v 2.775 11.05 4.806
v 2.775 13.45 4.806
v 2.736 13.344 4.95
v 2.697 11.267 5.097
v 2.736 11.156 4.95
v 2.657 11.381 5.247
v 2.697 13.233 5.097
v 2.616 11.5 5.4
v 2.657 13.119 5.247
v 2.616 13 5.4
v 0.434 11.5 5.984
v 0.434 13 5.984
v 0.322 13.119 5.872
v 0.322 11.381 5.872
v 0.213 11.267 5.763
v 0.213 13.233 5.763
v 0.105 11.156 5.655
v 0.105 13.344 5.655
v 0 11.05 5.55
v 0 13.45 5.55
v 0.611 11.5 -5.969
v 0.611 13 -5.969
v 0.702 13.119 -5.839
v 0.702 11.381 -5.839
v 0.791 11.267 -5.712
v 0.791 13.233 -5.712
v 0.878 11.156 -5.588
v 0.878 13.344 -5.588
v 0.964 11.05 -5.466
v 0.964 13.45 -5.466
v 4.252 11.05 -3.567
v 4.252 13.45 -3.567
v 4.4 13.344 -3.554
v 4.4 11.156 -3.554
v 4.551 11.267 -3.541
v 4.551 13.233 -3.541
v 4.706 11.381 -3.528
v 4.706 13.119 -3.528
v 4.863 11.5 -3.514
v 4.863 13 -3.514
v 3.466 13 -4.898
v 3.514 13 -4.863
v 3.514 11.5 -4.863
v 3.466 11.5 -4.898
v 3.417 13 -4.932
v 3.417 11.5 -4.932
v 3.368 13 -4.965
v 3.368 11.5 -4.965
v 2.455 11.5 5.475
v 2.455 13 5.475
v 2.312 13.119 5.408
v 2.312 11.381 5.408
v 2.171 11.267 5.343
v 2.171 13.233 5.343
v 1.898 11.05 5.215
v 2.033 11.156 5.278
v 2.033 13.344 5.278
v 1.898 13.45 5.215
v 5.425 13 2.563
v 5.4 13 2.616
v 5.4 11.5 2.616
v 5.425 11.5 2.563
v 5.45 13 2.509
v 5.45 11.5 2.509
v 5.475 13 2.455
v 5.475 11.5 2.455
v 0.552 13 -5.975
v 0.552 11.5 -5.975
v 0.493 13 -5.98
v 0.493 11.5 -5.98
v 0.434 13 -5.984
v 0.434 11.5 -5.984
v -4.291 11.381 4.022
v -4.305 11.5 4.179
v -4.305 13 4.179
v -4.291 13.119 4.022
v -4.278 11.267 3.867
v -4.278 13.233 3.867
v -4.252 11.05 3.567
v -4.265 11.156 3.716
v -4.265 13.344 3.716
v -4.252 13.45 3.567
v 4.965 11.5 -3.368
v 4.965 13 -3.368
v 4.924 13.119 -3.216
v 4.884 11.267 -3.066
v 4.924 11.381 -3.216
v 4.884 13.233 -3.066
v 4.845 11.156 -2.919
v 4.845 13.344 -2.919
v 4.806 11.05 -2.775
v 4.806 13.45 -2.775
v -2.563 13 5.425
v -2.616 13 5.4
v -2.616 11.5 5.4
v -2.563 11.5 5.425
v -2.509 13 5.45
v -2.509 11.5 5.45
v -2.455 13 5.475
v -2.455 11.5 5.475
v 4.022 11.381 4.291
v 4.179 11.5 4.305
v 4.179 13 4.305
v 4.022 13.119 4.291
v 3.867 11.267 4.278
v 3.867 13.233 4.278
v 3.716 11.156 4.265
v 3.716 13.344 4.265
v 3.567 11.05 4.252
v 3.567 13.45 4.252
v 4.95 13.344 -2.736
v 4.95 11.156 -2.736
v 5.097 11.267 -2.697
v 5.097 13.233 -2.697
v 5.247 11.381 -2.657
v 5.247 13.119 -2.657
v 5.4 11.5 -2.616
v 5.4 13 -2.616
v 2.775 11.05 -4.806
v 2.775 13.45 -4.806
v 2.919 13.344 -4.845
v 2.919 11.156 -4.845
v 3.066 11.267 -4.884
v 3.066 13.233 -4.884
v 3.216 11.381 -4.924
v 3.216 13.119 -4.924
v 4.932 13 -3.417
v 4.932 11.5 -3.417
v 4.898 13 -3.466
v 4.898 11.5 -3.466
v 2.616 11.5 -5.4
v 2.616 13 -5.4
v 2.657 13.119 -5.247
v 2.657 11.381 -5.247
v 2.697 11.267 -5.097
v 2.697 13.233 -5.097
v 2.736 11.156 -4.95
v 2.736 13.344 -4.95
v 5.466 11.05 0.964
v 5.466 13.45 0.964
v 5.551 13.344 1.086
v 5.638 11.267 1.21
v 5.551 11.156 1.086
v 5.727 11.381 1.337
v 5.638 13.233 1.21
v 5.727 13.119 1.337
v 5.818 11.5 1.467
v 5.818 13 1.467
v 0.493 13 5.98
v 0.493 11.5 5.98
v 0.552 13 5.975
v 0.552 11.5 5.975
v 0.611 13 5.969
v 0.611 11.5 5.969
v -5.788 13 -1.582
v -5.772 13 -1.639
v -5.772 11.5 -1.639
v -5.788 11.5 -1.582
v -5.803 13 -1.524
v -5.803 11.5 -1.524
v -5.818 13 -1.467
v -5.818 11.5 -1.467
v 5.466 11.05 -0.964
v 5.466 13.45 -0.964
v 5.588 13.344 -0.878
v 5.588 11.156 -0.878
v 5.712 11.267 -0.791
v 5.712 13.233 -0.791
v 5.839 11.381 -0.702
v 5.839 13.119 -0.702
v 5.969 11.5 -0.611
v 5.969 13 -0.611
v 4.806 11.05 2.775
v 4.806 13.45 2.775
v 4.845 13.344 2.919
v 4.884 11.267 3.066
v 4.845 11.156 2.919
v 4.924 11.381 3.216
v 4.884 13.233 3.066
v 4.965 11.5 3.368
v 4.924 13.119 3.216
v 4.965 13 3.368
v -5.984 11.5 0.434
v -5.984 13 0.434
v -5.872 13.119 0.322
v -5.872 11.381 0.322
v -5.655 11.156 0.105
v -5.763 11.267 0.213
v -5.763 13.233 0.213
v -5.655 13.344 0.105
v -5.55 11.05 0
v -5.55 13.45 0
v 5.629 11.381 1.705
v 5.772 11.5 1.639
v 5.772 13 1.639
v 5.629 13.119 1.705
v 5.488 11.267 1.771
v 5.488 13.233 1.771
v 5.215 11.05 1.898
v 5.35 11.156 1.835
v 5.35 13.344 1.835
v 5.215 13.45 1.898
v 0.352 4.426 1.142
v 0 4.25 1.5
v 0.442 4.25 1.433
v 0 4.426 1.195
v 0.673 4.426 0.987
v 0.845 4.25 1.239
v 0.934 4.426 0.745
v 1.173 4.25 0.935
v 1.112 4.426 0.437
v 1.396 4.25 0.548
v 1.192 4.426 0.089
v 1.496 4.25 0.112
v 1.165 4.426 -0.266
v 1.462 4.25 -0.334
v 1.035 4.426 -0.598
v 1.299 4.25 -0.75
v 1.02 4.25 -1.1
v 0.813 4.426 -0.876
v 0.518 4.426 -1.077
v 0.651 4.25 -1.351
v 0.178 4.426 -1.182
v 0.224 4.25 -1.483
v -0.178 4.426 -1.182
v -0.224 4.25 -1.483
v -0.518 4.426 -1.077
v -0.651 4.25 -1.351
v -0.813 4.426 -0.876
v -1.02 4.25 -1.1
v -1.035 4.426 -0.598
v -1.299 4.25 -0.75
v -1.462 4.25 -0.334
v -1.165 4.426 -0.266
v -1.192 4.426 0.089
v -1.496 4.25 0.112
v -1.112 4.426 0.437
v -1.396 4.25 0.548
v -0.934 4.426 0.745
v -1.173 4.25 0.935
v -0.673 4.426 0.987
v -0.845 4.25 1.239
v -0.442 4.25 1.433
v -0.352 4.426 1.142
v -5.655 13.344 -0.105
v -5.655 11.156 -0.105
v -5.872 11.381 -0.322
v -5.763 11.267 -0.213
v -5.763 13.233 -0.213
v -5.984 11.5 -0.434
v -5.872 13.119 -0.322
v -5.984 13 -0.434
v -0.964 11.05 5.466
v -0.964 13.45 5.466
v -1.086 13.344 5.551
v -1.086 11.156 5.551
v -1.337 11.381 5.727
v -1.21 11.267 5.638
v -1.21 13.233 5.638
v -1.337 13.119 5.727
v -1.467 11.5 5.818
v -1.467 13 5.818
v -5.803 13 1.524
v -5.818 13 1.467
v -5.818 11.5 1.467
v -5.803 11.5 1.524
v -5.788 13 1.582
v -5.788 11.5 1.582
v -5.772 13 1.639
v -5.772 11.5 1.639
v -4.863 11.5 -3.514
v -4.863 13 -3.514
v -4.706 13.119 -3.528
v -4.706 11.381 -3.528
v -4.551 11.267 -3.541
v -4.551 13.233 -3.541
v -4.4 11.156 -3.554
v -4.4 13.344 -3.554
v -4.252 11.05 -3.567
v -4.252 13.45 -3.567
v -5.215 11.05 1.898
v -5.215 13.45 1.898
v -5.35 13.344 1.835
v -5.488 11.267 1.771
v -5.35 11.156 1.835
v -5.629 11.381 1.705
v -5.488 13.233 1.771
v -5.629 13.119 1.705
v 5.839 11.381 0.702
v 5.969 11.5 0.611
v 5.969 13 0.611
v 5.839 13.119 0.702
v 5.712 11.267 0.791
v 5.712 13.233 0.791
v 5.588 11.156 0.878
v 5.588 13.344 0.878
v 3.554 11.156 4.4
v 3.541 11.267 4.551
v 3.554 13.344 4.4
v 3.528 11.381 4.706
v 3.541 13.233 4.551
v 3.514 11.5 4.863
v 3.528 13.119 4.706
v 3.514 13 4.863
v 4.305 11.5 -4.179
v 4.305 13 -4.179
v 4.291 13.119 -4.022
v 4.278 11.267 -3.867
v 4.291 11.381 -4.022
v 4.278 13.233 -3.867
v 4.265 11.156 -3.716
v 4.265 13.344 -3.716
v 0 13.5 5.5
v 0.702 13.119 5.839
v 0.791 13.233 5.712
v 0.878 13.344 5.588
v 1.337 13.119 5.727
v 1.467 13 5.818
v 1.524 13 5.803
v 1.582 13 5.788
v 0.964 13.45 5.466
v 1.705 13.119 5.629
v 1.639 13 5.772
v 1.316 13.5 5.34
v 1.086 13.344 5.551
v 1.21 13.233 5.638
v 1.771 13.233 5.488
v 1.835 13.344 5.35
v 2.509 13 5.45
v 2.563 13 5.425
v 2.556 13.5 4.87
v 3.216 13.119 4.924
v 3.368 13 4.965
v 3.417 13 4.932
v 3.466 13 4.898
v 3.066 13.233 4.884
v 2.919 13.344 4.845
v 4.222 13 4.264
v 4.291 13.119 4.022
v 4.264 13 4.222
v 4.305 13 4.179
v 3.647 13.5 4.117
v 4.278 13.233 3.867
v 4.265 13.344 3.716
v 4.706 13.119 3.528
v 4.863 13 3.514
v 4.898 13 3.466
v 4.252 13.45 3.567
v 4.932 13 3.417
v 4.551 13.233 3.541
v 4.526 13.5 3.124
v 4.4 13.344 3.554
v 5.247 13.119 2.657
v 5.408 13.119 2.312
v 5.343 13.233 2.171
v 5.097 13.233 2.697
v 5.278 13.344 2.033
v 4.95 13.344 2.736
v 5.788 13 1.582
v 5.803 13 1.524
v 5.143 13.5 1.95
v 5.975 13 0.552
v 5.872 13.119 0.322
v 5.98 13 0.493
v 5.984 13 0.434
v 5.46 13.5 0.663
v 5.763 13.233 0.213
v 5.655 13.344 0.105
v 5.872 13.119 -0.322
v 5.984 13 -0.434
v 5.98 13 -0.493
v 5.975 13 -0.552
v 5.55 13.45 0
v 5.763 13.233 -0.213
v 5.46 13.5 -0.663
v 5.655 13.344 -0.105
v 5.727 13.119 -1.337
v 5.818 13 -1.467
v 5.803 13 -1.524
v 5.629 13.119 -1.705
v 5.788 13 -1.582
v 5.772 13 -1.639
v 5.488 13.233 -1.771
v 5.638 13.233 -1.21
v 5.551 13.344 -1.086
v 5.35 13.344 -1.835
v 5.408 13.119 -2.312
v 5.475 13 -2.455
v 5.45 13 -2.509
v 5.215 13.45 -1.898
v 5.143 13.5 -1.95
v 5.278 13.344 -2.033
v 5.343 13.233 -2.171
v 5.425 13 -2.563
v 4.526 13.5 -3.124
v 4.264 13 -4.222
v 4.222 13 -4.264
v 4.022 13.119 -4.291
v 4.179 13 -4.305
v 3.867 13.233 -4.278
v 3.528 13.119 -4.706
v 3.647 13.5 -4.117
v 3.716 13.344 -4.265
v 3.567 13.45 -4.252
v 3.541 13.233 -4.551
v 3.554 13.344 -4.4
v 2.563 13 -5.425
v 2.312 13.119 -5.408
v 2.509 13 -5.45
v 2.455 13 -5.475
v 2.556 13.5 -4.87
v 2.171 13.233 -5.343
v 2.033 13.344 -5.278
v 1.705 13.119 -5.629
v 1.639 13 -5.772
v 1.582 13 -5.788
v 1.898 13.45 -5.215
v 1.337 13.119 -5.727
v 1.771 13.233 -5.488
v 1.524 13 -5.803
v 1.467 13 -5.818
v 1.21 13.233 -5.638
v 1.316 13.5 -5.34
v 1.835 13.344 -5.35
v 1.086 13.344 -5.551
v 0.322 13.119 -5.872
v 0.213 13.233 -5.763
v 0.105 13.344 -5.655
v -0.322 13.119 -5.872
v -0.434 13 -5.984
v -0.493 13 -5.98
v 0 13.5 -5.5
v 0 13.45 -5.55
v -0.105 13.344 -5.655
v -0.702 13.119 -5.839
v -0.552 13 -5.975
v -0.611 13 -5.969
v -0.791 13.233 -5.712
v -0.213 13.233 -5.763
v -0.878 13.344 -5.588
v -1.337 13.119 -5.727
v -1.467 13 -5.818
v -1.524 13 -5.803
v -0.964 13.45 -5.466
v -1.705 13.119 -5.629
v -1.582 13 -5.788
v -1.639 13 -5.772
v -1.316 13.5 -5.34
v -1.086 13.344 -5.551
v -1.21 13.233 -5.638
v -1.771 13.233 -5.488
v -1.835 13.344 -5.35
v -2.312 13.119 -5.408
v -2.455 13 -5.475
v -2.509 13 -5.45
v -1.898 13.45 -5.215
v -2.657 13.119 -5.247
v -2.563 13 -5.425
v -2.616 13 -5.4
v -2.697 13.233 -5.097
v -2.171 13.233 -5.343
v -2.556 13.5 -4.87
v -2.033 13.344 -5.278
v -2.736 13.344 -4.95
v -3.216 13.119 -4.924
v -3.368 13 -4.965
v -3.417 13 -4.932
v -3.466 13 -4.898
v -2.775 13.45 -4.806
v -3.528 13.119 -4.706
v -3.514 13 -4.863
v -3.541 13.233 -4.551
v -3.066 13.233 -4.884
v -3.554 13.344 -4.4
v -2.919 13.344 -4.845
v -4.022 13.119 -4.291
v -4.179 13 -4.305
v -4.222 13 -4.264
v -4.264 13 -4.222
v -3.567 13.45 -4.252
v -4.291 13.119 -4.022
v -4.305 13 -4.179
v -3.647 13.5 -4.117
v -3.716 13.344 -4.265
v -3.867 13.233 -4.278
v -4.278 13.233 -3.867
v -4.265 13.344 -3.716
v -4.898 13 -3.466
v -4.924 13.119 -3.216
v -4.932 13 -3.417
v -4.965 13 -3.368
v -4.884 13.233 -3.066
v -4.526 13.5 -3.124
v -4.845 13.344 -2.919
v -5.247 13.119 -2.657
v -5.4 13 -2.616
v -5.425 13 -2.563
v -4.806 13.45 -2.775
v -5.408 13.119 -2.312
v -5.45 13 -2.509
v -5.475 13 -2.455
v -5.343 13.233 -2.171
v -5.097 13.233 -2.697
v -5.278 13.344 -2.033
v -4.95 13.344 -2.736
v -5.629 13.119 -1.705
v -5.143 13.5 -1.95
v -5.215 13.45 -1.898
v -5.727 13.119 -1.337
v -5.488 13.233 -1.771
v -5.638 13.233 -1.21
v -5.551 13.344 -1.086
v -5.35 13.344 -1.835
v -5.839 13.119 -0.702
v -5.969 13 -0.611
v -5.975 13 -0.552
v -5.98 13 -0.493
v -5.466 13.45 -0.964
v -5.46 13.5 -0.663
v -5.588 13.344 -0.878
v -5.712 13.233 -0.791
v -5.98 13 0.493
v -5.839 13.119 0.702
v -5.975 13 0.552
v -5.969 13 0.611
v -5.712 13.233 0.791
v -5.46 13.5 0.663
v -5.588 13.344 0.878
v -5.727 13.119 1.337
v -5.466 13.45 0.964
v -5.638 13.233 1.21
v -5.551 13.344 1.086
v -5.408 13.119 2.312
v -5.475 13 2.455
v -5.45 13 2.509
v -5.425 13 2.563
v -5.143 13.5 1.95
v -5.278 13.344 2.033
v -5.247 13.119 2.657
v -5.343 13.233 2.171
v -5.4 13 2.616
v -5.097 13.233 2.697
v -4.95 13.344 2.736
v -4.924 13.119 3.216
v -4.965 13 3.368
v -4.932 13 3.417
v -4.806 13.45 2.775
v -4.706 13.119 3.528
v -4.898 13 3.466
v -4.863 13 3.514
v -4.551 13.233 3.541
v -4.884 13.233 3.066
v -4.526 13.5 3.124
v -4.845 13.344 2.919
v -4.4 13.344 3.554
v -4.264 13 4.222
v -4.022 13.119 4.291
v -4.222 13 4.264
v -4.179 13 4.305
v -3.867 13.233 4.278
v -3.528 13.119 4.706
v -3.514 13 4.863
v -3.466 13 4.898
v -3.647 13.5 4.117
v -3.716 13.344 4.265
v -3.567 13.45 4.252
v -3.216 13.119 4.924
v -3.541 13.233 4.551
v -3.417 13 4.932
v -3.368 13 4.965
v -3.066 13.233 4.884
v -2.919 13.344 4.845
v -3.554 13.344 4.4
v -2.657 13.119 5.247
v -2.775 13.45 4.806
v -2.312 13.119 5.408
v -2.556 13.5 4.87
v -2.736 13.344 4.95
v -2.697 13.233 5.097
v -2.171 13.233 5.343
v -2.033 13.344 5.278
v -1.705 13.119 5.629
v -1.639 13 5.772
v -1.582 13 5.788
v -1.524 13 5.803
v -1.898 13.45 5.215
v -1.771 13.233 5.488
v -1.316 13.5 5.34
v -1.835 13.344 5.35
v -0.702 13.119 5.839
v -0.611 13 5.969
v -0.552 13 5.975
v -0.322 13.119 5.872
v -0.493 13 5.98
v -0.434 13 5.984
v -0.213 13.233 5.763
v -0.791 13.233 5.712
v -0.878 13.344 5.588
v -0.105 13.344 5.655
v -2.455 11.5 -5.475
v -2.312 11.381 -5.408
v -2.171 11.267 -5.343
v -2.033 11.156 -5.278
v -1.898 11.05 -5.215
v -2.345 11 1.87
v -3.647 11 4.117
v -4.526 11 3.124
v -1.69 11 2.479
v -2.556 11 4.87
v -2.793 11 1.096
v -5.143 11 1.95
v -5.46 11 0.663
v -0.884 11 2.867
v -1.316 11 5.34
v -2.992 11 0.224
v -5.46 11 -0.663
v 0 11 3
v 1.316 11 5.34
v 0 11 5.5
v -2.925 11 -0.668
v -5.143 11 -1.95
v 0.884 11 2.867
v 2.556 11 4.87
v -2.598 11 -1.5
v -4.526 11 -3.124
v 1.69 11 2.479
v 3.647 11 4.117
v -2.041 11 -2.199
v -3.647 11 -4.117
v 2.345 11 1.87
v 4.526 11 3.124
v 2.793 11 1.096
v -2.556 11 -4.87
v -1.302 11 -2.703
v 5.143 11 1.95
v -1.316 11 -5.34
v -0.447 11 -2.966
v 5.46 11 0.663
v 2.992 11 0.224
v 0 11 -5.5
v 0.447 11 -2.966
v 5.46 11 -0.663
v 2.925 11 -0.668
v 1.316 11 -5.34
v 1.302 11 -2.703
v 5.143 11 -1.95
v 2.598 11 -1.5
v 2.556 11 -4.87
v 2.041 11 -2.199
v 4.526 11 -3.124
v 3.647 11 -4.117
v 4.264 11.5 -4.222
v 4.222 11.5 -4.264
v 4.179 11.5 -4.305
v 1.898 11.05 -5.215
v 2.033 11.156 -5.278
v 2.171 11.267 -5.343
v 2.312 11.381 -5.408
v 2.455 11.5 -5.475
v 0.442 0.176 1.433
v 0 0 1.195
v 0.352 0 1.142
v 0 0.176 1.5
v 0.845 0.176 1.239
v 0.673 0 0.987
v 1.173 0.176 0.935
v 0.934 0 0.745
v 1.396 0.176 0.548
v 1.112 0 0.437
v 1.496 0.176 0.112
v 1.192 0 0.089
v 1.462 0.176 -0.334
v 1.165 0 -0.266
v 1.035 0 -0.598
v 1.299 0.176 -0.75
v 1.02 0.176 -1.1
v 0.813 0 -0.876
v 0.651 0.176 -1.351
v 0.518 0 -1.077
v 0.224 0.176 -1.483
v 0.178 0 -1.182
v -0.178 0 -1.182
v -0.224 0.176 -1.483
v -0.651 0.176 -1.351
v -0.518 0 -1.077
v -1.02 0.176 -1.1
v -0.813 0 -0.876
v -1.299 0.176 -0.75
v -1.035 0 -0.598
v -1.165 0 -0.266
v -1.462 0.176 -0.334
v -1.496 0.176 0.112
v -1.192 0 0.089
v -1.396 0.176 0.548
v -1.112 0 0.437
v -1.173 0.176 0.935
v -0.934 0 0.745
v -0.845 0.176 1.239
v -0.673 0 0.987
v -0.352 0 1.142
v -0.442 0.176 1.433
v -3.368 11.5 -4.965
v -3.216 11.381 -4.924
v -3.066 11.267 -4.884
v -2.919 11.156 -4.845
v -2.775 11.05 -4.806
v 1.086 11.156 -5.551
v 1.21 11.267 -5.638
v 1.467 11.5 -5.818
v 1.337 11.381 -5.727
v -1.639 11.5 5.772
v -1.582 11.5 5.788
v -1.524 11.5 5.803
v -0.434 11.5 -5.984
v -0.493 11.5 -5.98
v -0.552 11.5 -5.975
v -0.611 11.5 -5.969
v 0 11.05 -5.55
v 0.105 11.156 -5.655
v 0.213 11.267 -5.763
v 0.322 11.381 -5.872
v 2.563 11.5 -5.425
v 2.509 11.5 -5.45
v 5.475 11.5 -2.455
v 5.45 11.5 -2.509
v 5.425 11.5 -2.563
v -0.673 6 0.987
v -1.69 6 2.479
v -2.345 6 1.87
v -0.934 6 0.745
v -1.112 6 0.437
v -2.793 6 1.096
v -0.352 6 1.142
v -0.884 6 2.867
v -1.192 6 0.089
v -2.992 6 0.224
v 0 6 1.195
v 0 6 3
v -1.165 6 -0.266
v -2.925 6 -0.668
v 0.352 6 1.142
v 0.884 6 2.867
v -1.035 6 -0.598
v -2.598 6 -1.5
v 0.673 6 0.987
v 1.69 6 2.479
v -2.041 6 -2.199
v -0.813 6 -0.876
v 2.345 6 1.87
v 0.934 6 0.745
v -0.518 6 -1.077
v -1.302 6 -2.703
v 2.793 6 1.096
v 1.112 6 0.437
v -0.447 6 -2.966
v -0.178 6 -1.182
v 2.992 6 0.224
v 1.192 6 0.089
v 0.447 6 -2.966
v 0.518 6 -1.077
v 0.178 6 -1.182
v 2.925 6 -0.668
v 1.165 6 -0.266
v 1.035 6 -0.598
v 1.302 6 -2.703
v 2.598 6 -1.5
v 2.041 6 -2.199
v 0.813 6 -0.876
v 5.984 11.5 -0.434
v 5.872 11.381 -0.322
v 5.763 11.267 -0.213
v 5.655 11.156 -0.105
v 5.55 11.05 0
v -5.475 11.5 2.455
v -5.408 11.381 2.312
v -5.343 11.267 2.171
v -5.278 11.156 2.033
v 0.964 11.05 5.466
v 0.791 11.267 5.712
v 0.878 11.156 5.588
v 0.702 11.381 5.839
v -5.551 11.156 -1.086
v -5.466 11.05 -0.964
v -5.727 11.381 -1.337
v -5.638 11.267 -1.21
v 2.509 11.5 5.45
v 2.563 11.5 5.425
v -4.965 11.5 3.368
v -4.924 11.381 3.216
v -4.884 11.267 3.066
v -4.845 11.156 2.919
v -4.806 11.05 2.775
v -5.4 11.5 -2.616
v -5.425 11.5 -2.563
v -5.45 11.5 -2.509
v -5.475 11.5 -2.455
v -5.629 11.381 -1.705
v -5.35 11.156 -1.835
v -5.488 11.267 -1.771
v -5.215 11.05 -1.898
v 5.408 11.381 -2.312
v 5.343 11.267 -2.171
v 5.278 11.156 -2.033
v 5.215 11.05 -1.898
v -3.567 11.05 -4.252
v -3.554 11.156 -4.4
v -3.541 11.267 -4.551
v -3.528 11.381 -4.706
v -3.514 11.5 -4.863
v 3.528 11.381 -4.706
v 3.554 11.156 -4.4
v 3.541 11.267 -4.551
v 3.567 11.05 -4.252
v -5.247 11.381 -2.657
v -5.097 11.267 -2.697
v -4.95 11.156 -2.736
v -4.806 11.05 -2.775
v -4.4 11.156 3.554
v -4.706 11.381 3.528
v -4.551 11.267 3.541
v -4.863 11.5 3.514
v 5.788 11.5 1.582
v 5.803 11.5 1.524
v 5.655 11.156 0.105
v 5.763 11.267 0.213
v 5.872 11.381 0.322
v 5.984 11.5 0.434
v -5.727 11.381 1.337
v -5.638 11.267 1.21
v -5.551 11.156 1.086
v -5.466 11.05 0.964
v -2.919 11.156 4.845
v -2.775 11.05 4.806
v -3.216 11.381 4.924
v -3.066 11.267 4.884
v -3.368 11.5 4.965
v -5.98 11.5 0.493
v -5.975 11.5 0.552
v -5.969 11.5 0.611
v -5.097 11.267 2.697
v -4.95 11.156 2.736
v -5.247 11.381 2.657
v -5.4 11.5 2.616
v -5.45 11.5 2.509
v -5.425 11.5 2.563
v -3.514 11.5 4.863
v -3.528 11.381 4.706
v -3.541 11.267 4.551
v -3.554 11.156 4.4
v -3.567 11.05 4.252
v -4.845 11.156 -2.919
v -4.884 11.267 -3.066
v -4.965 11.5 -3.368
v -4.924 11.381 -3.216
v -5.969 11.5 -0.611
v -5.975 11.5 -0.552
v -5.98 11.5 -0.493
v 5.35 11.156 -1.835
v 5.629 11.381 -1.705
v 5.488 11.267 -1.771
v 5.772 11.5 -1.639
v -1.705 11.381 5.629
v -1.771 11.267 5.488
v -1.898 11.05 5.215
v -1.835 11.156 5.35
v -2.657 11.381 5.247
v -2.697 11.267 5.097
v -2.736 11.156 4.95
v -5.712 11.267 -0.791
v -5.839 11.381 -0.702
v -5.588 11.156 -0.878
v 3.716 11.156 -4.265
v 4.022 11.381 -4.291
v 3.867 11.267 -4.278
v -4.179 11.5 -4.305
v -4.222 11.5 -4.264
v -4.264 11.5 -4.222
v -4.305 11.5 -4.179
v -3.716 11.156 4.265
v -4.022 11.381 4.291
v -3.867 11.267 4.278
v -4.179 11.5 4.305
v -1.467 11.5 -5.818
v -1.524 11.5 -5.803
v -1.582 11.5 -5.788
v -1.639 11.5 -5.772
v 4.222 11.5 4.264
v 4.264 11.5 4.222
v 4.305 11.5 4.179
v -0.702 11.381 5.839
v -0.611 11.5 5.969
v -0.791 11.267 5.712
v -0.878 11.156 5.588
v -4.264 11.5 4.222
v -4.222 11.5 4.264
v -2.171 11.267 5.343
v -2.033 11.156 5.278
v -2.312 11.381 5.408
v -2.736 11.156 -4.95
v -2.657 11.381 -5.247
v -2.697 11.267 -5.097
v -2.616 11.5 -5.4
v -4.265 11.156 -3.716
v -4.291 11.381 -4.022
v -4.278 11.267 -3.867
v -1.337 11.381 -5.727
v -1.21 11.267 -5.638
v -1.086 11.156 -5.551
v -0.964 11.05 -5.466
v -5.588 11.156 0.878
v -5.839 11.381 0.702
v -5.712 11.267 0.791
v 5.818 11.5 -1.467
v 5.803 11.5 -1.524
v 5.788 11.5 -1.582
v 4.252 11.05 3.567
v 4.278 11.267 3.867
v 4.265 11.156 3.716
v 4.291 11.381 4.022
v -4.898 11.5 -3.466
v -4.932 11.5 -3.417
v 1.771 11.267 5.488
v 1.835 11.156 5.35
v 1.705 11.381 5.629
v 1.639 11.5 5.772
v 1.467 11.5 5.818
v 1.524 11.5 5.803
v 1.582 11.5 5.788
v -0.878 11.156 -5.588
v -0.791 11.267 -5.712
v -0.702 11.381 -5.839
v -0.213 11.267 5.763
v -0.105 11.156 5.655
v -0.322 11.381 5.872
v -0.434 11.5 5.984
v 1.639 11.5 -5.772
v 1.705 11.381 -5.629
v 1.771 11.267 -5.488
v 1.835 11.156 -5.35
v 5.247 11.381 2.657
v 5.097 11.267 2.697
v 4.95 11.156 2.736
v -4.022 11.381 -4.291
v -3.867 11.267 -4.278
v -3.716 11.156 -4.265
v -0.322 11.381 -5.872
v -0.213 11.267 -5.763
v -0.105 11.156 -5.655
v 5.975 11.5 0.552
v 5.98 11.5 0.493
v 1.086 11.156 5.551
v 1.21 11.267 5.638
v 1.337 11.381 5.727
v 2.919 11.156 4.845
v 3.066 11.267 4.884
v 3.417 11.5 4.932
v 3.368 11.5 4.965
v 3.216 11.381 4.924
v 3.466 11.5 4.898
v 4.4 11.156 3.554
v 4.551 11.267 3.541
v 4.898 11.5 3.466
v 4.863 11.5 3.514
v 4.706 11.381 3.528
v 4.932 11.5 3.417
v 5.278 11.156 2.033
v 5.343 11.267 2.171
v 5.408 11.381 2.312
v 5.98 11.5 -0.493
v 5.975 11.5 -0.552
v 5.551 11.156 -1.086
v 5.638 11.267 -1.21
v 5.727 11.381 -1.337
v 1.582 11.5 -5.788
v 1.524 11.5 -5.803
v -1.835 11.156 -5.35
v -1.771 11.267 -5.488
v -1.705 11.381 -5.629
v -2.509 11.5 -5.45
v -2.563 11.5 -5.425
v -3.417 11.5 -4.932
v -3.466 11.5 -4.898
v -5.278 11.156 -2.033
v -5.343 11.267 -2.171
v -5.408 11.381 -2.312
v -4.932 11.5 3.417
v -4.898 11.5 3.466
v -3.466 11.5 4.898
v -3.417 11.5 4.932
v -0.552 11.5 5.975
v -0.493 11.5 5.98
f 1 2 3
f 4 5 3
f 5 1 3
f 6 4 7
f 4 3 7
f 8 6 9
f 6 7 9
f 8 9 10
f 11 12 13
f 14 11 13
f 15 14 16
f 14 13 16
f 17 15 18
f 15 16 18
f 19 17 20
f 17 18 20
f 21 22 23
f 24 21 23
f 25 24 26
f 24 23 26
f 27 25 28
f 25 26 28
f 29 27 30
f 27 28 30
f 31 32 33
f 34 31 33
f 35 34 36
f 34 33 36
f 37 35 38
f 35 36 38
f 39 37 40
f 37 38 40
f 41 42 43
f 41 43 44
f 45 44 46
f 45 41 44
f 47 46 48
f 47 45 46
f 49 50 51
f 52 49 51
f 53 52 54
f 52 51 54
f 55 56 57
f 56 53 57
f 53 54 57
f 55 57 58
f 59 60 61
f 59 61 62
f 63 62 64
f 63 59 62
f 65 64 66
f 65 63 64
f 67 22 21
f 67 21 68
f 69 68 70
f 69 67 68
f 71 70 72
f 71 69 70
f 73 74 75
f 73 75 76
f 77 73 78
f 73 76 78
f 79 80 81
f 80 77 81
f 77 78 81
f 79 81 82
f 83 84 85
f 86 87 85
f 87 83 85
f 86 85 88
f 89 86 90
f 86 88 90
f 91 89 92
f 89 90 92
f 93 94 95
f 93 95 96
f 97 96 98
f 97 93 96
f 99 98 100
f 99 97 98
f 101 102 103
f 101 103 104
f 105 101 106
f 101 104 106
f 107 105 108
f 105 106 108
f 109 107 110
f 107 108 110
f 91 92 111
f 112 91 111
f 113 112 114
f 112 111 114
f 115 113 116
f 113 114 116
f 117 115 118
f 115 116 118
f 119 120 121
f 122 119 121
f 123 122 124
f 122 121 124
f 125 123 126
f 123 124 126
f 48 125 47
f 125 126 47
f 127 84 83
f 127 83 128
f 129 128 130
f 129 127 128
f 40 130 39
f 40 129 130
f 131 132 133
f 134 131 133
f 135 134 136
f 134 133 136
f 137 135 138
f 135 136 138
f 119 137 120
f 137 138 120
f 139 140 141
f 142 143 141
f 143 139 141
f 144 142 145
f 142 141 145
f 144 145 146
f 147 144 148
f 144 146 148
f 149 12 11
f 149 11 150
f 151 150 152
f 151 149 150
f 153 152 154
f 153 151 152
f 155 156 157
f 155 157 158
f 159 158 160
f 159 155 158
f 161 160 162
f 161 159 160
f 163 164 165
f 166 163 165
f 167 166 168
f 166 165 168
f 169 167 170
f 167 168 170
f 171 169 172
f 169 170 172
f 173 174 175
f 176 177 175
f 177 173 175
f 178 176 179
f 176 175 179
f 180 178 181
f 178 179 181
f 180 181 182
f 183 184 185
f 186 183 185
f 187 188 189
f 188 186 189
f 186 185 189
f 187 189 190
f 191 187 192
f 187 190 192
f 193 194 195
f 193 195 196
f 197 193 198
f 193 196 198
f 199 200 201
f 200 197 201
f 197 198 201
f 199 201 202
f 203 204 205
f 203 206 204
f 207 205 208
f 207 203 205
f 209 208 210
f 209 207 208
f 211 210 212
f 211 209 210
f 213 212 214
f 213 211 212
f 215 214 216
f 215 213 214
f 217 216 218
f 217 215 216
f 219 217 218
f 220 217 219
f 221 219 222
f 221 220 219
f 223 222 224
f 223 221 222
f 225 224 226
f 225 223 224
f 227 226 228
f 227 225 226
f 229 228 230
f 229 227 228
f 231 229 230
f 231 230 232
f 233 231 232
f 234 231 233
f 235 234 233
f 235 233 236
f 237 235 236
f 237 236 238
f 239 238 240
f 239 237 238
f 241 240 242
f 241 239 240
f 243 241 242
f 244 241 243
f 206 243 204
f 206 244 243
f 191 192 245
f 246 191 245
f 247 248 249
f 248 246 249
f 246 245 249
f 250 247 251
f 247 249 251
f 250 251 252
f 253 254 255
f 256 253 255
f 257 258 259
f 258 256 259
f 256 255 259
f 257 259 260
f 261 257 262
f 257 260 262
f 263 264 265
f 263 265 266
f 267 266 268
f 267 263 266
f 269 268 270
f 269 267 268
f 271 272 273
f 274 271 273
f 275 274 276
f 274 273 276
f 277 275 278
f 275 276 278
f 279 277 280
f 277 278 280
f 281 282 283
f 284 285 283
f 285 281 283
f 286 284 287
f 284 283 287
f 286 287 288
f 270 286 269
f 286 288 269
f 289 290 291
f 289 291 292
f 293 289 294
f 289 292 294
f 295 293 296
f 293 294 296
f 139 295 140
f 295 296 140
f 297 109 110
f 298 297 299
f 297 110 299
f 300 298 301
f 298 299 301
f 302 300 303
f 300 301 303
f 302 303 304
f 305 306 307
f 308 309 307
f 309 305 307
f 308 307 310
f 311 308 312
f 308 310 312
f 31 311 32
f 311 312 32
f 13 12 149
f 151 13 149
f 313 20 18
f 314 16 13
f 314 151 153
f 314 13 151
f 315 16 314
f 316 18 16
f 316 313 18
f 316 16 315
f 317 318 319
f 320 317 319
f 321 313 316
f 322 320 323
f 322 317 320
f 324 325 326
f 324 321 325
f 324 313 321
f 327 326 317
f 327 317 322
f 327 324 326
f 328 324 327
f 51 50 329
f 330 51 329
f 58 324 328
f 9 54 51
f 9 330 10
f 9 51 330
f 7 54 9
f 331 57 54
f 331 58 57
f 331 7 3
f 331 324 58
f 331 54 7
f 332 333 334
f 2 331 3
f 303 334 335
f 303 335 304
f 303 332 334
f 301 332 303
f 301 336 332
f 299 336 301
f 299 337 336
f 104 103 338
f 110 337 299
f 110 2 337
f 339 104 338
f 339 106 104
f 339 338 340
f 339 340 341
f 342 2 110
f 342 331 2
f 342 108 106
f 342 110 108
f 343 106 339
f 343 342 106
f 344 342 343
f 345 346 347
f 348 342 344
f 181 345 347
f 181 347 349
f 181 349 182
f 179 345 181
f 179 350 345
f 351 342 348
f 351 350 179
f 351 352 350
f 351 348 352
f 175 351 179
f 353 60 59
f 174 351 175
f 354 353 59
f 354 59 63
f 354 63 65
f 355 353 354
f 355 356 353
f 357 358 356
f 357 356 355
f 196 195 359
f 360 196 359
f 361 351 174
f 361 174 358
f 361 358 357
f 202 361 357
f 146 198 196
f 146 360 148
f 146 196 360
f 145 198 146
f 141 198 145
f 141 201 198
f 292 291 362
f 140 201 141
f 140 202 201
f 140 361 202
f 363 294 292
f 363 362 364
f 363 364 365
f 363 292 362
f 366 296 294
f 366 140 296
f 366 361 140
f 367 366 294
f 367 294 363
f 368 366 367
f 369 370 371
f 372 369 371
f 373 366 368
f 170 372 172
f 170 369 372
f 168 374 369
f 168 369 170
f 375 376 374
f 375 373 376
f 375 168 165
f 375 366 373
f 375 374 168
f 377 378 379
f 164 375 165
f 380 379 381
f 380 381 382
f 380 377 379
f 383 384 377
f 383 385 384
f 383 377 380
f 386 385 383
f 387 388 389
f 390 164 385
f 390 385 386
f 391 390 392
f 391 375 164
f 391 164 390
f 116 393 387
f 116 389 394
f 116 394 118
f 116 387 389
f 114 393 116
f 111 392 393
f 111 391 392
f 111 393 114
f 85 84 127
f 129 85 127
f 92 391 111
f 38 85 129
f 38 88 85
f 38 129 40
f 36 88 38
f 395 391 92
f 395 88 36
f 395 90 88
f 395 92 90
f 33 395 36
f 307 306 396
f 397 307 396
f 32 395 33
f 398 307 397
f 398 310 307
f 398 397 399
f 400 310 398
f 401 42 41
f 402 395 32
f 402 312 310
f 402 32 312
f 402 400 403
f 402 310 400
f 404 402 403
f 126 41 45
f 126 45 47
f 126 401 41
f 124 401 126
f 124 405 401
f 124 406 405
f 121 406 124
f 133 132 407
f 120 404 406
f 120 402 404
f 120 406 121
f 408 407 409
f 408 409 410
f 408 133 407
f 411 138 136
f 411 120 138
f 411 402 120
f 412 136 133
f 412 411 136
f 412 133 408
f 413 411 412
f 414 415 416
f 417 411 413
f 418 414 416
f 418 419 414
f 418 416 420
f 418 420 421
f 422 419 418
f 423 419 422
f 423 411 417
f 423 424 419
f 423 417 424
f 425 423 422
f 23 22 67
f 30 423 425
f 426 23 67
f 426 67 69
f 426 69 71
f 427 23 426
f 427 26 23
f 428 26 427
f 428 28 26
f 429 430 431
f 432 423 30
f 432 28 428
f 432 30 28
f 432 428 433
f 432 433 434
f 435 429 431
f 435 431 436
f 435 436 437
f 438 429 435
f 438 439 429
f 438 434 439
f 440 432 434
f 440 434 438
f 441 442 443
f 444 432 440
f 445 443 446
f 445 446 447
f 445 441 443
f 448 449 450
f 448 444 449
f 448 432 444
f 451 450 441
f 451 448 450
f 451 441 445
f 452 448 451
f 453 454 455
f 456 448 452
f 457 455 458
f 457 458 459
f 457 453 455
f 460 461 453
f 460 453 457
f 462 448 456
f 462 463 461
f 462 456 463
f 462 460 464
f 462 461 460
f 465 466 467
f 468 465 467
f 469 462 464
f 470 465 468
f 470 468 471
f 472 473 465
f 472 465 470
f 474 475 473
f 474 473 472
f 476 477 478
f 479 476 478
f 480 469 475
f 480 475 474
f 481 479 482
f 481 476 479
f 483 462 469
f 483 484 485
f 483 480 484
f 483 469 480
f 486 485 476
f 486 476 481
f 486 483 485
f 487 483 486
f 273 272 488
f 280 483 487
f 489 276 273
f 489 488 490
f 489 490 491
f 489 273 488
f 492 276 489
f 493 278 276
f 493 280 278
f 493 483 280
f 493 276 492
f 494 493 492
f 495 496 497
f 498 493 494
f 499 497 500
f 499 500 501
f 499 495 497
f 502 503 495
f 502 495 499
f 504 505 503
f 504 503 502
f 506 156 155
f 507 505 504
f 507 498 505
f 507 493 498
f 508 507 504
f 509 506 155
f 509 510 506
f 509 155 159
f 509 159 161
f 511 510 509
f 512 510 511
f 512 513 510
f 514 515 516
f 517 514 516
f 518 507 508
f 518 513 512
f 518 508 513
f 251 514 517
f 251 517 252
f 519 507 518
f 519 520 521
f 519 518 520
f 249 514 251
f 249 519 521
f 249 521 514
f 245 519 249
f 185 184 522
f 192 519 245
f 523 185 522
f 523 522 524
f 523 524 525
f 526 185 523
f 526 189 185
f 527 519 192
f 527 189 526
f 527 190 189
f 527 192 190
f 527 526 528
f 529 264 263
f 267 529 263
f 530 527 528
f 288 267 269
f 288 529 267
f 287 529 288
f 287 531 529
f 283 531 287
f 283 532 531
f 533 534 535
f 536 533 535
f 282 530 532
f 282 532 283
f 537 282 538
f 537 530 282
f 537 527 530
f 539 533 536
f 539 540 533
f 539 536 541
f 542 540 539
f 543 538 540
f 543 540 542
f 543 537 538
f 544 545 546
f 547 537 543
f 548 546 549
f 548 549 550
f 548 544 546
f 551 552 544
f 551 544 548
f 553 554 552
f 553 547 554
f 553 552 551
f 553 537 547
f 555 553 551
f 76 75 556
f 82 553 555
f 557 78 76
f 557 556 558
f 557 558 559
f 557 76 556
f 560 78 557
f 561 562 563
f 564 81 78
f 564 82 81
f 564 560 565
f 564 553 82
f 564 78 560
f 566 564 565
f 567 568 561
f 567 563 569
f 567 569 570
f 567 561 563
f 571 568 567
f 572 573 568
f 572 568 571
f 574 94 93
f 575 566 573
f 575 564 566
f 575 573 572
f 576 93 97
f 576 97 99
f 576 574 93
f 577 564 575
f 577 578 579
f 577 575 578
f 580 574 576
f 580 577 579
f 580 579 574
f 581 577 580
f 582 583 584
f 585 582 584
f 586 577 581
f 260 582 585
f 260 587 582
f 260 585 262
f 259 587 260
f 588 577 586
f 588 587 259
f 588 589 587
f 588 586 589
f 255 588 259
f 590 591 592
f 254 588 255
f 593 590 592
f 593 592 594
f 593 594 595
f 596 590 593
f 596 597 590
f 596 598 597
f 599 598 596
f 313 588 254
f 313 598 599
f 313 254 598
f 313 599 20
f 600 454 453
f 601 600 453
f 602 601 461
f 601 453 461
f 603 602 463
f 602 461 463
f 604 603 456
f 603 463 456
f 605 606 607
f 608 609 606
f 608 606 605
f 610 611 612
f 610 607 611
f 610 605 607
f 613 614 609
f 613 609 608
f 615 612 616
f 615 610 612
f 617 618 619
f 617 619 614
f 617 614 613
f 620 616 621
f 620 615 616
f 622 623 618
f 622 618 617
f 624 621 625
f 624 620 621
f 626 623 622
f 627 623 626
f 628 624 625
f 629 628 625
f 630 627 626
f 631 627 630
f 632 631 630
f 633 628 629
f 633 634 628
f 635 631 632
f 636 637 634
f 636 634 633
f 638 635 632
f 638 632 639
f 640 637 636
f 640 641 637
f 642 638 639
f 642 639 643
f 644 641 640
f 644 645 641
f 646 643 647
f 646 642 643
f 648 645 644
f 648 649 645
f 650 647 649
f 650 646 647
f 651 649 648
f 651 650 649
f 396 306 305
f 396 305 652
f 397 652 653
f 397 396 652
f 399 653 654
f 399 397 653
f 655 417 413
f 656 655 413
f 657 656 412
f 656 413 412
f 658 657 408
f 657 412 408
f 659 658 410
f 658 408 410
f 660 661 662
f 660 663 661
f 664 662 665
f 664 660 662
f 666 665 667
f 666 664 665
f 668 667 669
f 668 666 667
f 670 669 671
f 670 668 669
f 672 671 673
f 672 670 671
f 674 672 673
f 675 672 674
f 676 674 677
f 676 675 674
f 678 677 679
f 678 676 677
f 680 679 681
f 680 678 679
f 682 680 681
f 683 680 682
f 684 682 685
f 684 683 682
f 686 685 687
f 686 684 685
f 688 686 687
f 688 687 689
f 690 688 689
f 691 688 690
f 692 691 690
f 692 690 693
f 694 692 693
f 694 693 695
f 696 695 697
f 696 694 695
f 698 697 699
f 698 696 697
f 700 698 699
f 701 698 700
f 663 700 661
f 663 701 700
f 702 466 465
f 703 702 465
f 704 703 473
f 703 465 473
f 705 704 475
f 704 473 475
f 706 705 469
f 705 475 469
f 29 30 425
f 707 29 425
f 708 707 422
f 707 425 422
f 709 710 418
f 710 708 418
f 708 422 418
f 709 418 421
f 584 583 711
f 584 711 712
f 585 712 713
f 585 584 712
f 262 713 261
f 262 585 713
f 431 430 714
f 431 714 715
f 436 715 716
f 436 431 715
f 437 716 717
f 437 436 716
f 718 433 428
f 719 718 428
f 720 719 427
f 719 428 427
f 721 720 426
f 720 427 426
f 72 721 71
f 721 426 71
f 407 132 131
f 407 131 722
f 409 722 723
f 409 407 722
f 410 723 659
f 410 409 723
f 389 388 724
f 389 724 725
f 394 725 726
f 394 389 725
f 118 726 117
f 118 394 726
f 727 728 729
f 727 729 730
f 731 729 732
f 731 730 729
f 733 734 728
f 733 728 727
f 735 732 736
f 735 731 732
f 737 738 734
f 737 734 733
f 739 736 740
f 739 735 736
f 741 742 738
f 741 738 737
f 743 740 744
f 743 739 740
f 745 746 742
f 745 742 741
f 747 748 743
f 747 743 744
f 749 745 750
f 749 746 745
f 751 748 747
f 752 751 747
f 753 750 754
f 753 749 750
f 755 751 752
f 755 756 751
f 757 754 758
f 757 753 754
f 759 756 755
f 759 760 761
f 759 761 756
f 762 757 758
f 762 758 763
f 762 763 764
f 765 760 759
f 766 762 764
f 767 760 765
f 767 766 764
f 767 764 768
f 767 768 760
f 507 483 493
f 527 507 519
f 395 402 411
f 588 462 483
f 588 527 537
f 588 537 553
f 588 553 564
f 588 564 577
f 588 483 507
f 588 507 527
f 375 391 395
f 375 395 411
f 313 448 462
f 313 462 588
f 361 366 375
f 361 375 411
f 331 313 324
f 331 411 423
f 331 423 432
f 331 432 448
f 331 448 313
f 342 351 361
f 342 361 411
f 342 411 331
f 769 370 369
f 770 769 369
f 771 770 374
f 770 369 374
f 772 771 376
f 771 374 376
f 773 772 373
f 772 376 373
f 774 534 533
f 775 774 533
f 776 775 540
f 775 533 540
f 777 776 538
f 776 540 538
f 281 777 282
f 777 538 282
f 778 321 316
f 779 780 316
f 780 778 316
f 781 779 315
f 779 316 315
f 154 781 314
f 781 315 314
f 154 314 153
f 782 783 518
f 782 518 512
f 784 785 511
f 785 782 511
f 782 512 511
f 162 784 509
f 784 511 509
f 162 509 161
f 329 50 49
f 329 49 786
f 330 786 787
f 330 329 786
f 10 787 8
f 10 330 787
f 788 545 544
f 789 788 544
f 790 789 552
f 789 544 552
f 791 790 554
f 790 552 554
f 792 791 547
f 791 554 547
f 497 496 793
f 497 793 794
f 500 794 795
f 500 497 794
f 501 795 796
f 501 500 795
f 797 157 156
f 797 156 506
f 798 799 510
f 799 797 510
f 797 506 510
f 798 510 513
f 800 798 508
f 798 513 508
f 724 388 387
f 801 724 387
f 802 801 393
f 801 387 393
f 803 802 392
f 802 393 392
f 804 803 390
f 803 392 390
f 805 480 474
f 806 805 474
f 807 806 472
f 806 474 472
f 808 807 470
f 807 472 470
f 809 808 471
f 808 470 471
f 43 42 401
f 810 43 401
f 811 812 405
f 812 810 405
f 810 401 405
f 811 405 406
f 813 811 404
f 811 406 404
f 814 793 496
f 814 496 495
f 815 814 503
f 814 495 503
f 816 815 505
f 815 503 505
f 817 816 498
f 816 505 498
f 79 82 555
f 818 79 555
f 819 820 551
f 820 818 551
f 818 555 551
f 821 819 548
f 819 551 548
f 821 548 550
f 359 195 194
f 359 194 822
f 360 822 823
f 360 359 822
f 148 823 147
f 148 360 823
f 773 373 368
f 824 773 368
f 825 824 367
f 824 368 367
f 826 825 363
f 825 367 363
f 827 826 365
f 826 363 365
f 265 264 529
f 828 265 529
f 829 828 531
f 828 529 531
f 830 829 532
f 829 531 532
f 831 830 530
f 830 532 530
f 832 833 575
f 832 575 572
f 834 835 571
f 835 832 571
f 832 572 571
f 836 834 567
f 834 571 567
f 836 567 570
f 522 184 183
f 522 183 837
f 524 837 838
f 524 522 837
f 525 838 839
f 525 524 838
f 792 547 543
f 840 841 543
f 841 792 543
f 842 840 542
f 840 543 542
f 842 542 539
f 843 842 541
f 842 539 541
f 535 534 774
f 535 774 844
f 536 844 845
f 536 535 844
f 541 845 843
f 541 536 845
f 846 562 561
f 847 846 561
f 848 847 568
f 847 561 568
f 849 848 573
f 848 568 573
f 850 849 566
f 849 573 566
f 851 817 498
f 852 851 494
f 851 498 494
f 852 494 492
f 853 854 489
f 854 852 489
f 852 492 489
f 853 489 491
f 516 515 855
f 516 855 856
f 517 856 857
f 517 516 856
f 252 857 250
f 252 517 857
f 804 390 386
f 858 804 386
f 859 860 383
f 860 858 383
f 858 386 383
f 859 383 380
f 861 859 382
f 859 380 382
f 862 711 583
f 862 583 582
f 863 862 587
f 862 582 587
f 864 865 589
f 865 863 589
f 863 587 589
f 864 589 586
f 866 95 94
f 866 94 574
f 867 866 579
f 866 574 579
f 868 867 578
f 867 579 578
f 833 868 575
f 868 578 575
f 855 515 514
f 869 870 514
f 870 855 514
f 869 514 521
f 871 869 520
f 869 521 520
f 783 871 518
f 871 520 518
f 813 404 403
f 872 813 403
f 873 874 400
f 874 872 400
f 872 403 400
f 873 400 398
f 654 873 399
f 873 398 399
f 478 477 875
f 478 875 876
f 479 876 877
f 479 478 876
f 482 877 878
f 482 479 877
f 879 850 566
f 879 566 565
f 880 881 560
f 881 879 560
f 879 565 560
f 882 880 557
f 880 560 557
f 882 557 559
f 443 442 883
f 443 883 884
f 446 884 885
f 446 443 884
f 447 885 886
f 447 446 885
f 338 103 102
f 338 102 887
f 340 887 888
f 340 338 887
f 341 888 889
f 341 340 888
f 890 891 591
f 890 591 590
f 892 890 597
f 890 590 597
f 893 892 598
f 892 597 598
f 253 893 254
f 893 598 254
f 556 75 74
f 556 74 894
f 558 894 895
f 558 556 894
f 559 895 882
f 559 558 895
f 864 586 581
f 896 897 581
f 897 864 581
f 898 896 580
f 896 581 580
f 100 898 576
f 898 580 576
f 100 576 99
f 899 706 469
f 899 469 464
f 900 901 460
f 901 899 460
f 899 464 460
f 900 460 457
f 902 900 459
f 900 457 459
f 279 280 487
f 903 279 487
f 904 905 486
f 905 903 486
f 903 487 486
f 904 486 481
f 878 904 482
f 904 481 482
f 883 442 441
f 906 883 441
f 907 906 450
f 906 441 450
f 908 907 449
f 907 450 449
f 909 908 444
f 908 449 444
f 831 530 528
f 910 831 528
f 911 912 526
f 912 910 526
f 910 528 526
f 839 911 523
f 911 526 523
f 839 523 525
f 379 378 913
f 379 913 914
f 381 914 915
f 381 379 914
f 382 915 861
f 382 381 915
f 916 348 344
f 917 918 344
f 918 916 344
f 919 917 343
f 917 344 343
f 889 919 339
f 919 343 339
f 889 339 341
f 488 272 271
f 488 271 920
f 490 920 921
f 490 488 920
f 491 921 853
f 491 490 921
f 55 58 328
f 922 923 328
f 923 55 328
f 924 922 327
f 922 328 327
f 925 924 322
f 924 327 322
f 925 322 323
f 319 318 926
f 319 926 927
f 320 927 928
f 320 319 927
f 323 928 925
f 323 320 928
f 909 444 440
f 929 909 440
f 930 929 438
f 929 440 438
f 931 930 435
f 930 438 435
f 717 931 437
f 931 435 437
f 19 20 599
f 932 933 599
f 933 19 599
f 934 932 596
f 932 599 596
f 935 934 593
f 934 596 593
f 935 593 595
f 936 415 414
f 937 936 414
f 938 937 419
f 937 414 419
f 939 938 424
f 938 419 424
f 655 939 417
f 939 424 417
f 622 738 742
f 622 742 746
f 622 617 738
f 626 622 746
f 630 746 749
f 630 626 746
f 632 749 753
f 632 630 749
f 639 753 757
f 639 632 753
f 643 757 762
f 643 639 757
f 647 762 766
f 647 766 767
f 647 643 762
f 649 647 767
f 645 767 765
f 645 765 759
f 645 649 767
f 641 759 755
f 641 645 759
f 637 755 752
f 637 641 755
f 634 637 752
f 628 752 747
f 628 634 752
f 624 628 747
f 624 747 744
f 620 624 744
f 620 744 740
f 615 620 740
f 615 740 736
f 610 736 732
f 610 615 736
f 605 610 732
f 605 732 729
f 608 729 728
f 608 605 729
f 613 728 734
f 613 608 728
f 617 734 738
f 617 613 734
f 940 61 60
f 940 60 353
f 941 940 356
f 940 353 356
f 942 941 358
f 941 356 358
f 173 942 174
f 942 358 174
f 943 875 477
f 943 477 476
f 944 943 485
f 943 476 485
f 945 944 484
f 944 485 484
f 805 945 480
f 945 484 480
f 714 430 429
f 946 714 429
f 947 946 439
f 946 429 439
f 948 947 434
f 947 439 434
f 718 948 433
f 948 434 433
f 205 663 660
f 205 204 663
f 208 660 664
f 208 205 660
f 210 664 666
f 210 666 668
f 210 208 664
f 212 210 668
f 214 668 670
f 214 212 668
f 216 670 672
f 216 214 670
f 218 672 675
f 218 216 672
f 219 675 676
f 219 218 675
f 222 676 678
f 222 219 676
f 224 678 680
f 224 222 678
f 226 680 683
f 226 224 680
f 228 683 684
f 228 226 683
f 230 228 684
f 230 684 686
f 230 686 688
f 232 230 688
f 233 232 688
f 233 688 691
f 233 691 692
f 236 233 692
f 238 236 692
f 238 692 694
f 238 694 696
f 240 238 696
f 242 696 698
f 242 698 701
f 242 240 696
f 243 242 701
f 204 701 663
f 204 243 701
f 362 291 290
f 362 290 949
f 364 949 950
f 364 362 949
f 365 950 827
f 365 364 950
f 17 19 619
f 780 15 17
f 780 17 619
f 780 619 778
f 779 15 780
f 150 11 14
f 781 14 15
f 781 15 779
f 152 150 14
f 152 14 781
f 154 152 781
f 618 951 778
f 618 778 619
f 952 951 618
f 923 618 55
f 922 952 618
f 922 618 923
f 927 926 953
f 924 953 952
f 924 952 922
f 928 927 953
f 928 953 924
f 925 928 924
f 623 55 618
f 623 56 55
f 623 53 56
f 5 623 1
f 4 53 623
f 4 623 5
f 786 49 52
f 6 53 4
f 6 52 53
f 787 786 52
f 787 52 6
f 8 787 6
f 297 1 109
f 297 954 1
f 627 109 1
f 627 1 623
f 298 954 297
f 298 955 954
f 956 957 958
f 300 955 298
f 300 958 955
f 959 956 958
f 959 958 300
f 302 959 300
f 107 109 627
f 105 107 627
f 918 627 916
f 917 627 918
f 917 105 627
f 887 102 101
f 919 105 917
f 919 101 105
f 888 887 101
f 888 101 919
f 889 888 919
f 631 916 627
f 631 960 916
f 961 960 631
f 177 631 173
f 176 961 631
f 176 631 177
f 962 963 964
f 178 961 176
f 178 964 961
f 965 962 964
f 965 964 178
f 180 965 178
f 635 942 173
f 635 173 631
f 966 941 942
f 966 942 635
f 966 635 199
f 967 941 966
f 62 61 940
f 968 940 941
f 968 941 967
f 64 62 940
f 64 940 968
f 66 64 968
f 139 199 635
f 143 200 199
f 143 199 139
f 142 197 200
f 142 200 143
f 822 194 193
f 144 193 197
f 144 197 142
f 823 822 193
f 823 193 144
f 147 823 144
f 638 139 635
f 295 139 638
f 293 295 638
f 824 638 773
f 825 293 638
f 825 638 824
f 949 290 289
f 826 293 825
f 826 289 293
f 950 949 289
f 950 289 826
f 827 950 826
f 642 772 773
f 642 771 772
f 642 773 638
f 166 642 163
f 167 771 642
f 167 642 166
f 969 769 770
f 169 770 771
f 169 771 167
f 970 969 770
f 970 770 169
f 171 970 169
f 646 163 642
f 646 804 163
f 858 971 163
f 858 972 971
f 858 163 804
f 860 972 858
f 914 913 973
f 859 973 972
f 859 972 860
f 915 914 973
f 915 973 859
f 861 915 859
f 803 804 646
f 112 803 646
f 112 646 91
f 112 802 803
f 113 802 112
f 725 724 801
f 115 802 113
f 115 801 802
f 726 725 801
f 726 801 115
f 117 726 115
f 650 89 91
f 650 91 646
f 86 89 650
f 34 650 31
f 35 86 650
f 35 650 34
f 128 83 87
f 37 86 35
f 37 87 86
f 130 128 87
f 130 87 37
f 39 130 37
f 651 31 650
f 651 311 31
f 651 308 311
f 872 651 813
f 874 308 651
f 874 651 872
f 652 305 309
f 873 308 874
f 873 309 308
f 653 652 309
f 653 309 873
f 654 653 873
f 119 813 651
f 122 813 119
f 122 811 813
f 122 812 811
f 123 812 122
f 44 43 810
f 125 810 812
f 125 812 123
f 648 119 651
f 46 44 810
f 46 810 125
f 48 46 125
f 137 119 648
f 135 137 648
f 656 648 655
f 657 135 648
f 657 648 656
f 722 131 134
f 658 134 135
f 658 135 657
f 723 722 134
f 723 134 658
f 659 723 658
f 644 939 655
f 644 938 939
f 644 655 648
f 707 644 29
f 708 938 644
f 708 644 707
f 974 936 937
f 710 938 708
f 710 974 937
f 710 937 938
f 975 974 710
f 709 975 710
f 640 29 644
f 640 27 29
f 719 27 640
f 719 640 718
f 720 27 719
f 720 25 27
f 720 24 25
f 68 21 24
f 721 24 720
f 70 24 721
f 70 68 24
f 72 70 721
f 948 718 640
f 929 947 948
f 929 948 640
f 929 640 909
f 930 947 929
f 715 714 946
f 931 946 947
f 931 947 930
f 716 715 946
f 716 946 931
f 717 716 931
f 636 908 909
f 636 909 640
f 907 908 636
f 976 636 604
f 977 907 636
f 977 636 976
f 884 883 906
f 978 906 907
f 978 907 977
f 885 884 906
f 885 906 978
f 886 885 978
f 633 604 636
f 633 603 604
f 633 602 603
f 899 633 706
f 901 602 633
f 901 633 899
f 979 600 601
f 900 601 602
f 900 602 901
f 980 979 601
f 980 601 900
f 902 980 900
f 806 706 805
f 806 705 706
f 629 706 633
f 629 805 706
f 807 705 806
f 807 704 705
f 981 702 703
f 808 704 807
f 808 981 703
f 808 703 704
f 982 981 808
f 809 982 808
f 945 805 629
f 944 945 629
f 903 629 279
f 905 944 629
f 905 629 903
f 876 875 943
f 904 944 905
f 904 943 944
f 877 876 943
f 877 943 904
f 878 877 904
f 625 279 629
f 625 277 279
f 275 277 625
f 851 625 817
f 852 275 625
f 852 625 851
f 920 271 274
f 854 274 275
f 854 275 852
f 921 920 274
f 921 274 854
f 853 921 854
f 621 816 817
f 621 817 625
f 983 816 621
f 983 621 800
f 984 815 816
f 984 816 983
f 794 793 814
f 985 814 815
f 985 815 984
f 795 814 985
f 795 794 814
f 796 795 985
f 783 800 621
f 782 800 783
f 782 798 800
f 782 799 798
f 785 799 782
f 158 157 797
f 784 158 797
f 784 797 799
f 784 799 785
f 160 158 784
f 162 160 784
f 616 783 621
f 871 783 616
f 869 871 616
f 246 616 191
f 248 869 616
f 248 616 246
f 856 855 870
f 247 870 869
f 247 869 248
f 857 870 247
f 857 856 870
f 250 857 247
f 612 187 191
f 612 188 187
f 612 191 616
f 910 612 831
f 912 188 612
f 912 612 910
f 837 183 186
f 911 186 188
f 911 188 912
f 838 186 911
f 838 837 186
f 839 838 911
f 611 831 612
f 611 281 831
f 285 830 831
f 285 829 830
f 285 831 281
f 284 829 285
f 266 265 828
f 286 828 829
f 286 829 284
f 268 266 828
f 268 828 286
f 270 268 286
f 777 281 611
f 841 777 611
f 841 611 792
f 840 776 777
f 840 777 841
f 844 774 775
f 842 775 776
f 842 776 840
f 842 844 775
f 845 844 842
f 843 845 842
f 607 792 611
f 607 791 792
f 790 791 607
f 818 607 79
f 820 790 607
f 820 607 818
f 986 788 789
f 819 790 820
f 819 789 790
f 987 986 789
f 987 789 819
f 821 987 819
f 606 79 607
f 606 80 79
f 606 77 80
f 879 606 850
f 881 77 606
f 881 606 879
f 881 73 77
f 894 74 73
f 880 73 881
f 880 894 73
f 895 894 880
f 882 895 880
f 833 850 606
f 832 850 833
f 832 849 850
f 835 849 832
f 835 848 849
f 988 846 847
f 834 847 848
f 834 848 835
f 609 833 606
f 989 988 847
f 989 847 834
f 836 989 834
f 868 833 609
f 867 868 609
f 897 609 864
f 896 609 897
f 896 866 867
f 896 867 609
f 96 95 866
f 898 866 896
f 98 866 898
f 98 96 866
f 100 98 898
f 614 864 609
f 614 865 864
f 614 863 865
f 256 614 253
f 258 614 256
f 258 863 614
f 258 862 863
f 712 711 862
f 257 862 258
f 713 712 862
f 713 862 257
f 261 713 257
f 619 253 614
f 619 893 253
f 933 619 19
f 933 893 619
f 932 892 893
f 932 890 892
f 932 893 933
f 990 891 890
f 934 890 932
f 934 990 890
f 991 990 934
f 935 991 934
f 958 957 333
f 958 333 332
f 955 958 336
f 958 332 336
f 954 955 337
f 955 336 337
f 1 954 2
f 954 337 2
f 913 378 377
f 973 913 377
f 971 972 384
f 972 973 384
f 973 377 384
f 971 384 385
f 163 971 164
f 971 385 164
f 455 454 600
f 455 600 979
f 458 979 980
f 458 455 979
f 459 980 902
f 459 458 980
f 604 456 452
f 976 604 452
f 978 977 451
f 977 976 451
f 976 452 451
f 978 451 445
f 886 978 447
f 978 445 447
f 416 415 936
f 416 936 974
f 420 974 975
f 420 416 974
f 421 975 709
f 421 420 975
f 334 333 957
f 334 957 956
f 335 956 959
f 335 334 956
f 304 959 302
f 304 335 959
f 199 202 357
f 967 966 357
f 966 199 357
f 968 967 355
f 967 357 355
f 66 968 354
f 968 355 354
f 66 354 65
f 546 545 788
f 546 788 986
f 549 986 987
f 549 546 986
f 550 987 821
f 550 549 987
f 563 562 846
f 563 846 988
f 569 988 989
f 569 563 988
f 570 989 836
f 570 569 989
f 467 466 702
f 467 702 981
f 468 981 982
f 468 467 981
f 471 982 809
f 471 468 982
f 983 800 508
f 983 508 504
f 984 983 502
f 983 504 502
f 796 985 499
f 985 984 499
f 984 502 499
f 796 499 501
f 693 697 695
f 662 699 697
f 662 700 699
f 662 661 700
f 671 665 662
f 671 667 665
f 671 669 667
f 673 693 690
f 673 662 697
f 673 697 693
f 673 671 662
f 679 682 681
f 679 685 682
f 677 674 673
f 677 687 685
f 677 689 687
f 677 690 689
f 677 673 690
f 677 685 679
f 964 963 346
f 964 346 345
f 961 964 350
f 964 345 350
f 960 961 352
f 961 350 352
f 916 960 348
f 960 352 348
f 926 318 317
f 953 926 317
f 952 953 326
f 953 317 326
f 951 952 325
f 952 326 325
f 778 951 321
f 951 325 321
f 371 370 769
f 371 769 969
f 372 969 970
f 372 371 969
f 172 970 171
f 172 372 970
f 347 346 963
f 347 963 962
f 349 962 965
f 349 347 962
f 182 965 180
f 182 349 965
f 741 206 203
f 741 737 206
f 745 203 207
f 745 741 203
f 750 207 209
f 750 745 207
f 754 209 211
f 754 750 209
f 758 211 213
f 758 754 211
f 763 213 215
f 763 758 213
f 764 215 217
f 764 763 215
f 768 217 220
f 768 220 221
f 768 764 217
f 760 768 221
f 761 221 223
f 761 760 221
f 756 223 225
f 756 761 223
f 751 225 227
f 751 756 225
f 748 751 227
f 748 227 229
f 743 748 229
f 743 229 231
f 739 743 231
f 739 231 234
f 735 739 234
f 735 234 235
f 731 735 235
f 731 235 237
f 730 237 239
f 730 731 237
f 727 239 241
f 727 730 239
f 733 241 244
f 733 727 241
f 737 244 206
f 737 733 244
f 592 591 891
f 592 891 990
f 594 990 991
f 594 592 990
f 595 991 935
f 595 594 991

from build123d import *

# Parameters (mm, degrees)
POCKET_DEPTH       = 56.871497
POLARPATTERN_COUNT = 36


with BuildPart() as part:
    # Sketch → Revolution (revolve)
    with BuildSketch(Plane.YZ):
        Polygon((0, 0), (0, 1.195), (0.176092, 1.5), (4.25, 1.5), (4.426092, 1.195), (6, 1.195), (6, 3), (11, 3), (11, 5.5), (11.5, 6), (13, 6), (13.5, 5.5), (13.5, 0), align=None)
    revolve(axis=Axis((0, 0, 0), (0, 1, 0)))

    # Sketch001 → Pocket (cut, through all)
    with BuildSketch(Plane.ZX.offset(13.5)):
        Polygon((-0.5, 6.05), (0, 5.55), (0.5, 6.05), align=None)
    pocket = extrude(amount=-POCKET_DEPTH, mode=Mode.SUBTRACT)

    # PolarPattern: Pocket ×36 about axis
    polarpattern_axis = Axis((0, 13.5, 0), (0, 1, 0))
    for i in range(1, POLARPATTERN_COUNT):
        add(pocket.rotate(polarpattern_axis, i * 360 / POLARPATTERN_COUNT), mode=Mode.SUBTRACT)


solid = part.part
